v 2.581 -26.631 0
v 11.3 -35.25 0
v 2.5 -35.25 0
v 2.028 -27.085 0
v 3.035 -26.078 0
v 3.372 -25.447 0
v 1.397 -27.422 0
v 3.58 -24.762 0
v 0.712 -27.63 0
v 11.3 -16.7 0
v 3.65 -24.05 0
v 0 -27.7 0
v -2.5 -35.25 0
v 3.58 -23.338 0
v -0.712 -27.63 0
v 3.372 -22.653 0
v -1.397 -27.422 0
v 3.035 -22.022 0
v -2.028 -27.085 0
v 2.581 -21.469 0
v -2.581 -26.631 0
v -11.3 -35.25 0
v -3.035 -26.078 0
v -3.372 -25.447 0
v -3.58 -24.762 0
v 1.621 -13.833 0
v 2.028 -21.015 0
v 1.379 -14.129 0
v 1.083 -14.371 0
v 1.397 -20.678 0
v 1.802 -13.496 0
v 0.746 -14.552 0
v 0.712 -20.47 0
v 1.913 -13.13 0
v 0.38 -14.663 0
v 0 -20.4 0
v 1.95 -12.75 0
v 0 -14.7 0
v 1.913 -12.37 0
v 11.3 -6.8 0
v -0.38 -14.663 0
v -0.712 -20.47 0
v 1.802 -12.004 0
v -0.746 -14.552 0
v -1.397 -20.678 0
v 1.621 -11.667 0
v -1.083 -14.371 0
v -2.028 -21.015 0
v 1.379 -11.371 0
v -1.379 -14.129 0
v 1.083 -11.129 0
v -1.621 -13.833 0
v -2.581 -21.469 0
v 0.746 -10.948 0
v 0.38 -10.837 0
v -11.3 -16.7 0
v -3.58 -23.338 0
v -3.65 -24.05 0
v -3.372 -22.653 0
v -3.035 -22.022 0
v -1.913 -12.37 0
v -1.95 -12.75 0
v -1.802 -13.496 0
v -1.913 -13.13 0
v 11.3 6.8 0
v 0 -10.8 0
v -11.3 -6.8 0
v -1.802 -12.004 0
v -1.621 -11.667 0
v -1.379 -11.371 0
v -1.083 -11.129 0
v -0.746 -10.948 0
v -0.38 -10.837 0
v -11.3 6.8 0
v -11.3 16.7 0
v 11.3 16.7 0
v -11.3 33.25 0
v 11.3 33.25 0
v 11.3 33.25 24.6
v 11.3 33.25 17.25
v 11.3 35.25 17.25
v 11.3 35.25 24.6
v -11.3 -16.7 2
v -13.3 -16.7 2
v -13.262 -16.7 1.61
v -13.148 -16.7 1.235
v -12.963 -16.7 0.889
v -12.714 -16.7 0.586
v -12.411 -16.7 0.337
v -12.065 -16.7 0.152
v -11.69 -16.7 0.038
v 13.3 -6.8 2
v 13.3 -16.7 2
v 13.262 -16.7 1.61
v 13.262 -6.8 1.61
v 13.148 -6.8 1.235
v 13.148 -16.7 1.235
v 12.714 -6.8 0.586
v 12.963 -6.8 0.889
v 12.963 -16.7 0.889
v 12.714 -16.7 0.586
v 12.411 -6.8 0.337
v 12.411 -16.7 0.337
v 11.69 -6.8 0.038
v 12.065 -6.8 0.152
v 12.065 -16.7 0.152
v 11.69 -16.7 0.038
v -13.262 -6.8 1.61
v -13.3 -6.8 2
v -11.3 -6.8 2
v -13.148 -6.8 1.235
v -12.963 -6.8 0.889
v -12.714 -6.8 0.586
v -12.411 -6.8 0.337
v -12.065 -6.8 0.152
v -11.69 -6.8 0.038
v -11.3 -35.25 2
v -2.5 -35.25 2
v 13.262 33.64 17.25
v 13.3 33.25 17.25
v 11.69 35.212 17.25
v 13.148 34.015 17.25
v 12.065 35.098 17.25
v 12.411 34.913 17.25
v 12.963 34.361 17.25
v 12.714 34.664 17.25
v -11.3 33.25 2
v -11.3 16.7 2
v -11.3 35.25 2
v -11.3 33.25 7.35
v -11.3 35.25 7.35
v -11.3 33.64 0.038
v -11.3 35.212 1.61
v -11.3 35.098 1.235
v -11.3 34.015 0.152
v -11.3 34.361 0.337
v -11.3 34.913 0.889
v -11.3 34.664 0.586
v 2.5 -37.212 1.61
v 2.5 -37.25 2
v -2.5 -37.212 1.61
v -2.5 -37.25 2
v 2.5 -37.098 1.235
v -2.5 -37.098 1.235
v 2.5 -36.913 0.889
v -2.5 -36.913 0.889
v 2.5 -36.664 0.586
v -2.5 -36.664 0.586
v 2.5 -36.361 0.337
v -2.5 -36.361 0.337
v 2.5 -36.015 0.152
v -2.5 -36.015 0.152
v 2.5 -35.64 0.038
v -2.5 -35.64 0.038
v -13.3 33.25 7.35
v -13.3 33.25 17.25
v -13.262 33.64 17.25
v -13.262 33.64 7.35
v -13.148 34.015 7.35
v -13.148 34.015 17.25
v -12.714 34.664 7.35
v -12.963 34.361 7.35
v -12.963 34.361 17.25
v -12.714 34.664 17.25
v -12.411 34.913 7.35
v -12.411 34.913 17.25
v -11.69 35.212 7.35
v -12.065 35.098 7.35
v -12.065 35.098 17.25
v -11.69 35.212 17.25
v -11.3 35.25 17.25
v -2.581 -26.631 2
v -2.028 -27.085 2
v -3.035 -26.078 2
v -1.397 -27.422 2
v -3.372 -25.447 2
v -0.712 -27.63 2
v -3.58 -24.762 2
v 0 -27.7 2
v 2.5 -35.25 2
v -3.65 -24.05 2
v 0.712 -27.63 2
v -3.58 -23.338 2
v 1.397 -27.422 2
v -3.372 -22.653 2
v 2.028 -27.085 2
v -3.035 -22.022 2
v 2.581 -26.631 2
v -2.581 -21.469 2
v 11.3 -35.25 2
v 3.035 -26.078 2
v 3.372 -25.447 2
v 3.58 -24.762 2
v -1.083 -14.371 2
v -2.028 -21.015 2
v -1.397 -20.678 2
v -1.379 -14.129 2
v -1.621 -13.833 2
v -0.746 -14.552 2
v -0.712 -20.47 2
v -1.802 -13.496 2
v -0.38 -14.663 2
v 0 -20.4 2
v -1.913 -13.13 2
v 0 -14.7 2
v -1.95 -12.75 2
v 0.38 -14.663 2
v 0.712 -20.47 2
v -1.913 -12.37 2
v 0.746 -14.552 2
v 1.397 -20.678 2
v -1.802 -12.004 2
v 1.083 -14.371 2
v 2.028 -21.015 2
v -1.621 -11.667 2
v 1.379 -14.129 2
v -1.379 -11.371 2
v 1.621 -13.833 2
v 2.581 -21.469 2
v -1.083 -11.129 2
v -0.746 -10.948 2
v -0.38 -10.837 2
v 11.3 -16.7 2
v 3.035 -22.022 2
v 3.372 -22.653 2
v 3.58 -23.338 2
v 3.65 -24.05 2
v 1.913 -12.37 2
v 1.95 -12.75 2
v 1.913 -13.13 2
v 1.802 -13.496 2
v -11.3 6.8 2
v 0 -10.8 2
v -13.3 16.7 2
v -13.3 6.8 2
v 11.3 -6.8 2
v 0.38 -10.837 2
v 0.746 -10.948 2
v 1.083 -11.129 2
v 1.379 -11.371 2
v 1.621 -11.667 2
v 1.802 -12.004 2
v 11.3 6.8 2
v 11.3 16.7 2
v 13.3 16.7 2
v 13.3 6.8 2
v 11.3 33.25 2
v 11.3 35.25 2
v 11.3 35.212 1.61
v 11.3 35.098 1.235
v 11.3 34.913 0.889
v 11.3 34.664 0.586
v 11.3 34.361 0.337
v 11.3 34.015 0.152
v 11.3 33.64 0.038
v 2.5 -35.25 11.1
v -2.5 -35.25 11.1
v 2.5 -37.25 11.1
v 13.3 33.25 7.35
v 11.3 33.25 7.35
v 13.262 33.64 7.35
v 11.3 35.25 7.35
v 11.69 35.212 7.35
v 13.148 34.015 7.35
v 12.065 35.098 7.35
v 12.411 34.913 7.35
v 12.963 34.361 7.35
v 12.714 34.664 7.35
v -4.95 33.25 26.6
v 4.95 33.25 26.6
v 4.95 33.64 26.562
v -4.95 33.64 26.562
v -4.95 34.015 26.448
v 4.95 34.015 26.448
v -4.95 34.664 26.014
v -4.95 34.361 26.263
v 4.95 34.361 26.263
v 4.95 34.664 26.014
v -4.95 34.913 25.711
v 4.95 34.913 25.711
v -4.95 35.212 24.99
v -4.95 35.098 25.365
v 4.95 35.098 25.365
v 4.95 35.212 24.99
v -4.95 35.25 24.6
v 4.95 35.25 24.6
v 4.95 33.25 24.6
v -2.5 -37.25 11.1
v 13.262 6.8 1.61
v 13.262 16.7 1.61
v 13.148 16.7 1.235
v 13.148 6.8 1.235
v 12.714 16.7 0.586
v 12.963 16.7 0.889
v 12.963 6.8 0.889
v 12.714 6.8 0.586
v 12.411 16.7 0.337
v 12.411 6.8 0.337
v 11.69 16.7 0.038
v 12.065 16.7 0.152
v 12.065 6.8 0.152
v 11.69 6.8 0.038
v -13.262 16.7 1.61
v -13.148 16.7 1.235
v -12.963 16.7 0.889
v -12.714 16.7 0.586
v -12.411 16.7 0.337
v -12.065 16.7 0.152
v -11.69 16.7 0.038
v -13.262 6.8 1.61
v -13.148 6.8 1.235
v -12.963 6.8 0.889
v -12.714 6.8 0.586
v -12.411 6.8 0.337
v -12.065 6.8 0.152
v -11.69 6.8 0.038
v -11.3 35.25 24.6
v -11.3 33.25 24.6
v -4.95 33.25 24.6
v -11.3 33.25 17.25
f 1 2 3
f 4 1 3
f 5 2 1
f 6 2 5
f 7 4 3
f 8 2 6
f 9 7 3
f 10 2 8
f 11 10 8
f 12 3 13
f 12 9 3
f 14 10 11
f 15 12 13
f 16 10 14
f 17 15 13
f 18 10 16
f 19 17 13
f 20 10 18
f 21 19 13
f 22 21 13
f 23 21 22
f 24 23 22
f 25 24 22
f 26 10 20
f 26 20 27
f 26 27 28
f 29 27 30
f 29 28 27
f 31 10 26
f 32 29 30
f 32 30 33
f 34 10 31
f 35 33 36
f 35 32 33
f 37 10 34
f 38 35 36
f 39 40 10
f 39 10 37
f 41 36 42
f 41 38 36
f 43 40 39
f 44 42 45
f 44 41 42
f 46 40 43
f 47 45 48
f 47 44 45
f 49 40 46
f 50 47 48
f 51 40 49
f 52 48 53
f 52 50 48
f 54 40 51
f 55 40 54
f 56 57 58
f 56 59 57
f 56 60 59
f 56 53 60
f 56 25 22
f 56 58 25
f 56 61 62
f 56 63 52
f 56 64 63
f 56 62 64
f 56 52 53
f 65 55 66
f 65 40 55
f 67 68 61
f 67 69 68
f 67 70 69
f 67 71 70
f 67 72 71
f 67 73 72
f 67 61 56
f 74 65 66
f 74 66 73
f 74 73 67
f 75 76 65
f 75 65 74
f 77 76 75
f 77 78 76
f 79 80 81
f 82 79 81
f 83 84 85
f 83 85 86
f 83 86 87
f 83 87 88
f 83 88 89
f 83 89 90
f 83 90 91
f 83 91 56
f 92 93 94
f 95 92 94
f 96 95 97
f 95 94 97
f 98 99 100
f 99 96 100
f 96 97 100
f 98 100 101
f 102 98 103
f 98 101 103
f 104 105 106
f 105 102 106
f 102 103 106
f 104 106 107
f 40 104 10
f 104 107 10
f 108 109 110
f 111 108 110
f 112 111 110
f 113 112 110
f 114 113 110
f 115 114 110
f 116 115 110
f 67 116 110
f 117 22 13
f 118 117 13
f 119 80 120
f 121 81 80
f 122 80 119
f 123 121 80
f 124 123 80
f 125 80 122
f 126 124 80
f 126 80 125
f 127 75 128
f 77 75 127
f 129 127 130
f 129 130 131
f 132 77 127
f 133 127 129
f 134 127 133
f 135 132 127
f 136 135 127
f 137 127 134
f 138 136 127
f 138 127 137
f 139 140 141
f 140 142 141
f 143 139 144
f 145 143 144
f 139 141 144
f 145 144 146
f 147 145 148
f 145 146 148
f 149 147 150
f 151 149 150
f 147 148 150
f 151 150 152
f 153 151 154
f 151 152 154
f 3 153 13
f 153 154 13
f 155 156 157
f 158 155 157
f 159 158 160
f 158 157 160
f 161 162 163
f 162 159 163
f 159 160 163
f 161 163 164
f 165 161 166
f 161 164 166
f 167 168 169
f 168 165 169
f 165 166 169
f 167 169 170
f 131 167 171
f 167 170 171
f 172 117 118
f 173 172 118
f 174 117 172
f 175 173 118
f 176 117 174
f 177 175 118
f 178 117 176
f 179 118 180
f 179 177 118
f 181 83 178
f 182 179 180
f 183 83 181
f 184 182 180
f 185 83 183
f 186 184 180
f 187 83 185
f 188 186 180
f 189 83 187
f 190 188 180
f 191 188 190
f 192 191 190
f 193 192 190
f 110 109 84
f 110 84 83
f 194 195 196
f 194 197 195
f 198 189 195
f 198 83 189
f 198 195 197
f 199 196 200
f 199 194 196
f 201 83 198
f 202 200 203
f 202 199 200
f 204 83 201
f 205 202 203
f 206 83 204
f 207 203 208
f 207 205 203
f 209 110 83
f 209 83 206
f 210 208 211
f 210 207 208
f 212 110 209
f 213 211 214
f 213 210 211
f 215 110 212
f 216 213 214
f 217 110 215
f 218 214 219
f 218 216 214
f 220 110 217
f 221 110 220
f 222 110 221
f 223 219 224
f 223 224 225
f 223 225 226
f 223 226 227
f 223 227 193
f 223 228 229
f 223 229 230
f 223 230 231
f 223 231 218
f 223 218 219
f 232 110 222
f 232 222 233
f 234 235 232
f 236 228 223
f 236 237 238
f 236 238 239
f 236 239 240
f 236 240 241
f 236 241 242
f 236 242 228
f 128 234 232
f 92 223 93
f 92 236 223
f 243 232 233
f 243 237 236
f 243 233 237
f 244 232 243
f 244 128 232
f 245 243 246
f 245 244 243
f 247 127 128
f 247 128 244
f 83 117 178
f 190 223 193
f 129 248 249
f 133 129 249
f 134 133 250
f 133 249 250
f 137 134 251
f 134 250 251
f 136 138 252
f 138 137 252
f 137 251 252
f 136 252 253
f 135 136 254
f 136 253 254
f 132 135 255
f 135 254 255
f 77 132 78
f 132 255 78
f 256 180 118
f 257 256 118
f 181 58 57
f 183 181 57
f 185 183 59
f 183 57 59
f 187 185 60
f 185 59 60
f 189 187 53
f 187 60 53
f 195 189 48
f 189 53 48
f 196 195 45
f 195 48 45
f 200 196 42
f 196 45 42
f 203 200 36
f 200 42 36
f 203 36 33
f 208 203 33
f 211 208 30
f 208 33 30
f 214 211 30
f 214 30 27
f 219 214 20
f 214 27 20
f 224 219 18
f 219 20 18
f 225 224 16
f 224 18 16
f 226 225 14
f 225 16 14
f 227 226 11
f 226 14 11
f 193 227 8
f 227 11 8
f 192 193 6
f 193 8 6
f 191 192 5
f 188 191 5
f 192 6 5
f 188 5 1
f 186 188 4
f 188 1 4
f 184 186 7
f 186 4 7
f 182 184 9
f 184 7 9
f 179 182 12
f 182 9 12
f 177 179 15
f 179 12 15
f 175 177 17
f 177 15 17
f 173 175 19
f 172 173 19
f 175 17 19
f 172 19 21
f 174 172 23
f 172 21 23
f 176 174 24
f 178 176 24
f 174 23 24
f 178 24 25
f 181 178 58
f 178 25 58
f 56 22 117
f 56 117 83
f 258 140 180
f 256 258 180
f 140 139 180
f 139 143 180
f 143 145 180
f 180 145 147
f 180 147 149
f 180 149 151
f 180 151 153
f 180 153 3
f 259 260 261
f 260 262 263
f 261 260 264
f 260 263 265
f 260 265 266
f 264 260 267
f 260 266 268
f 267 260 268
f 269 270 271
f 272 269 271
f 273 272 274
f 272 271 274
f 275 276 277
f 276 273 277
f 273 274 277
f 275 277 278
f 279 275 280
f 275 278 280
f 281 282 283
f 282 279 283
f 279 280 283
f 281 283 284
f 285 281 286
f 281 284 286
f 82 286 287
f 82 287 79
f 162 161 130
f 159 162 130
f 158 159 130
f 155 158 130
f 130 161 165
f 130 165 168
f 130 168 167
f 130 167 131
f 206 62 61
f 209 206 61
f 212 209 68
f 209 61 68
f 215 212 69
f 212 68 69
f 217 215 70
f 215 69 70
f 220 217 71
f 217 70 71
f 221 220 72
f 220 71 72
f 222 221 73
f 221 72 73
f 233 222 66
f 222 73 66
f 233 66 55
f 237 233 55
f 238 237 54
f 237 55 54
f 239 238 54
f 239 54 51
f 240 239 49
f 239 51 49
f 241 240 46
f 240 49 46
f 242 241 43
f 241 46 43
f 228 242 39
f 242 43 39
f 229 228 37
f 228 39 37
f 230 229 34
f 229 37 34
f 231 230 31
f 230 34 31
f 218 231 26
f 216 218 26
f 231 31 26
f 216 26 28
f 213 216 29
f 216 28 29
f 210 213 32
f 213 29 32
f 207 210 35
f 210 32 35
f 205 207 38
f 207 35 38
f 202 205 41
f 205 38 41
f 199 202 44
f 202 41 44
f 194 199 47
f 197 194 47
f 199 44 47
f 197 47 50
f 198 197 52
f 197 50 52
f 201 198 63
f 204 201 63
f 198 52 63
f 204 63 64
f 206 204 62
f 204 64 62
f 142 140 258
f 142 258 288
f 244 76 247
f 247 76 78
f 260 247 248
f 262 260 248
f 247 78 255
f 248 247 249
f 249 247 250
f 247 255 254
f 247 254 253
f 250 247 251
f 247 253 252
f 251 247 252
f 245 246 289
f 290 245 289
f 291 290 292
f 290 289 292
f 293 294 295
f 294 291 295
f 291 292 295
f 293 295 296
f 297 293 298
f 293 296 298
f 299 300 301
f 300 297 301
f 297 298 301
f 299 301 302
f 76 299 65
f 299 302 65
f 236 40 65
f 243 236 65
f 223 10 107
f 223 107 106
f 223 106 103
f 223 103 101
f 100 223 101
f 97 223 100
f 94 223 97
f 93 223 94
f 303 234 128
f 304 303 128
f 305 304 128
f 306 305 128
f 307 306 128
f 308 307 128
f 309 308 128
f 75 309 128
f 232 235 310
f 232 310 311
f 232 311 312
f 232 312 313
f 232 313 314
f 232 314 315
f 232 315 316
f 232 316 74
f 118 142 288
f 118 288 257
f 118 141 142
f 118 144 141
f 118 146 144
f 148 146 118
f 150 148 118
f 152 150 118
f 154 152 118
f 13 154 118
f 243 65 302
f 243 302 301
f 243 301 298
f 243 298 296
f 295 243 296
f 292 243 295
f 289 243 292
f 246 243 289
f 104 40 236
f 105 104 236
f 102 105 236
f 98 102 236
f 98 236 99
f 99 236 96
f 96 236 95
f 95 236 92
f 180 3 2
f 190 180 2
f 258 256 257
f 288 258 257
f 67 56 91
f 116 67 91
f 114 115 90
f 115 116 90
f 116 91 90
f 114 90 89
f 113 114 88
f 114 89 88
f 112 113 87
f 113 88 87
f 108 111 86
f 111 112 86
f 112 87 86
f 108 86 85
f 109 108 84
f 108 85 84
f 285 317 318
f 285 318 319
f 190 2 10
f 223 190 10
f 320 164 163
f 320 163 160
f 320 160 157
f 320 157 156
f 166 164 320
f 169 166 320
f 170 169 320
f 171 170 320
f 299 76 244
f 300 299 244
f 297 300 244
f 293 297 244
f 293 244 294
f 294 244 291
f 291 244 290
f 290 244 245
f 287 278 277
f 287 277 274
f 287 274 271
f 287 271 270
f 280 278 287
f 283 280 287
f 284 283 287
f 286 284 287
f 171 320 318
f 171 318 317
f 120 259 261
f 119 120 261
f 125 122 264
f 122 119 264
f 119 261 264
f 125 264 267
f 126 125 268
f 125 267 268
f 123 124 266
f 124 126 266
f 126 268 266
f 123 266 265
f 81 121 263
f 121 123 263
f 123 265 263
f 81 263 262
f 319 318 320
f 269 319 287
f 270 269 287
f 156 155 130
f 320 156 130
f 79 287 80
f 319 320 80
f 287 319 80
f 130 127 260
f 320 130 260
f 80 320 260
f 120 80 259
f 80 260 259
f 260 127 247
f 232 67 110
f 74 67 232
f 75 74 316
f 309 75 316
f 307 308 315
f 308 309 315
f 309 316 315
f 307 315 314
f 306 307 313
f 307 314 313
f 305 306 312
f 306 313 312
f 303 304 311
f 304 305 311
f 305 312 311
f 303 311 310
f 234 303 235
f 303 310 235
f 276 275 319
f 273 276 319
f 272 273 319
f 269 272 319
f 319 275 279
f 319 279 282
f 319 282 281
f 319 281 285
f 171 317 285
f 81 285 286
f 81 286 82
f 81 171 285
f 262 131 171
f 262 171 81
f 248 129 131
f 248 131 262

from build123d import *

# Parameters (mm, degrees)
SKETCH1_W           = 22.6
SKETCH1_H           = 70.5
BOSS_EXTRUDE1_DEPTH = 2
SKETCH2_W           = 22.6
SKETCH2_H           = 2
BOSS_EXTRUDE2_DEPTH = 22.6
SKETCH3_W           = 2
SKETCH3_H           = 9.9
SKETCH3_W_2         = 9.9
SKETCH3_H_2         = 2
BOSS_EXTRUDE3_DEPTH = 2
SKETCH4_W           = 2
SKETCH4_H           = 9.9
BOSS_EXTRUDE4_DEPTH = 2
FILLET1_R           = 2
SKETCH5_W           = 5
SKETCH5_H           = 2
BOSS_EXTRUDE5_DEPTH = 11.1
FILLET2_R           = 2
SKETCH6_R           = 3.65
SKETCH6_R_2         = 1.95
CUT_EXTRUDE1_DEPTH  = 2


with BuildPart() as part:
    # Sketch1 → Boss-Extrude1 (new body)
    with BuildSketch(Plane.XY):
        Rectangle(SKETCH1_W, SKETCH1_H)
    extrude(amount=BOSS_EXTRUDE1_DEPTH)

    # Sketch2 → Boss-Extrude2 (add)
    with BuildSketch(Plane.XY.offset(2)):
        with Locations((0, 34.25)):
            Rectangle(SKETCH2_W, SKETCH2_H)
    extrude(amount=BOSS_EXTRUDE2_DEPTH)

    # Sketch3 → Boss-Extrude3 (add)
    with BuildSketch(Plane(origin=(0, 35.25, 0), x_dir=(1, 0, 0), z_dir=(0, 1, 0))):
        with Locations((-12.3, -12.3)):
            Rectangle(SKETCH3_W, SKETCH3_H)
        with Locations((12.3, -12.3)):
            Rectangle(SKETCH3_W, SKETCH3_H)
        with Locations((0, -25.6)):
            Rectangle(SKETCH3_W_2, SKETCH3_H_2)
    extrude(amount=-BOSS_EXTRUDE3_DEPTH)

    # Sketch4 → Boss-Extrude4 (add)
    with BuildSketch(Plane.XY.offset(2)):
        with Locations((12.3, 11.75)):
            Rectangle(SKETCH4_W, SKETCH4_H)
        with Locations((12.3, -11.75)):
            Rectangle(SKETCH4_W, SKETCH4_H)
        with Locations((-12.3, -11.75)):
            Rectangle(SKETCH4_W, SKETCH4_H)
        with Locations((-12.3, 11.75)):
            Rectangle(SKETCH4_W, SKETCH4_H)
    extrude(amount=-BOSS_EXTRUDE4_DEPTH)

    # Fillet1
    # the kernel refuses this fillet: 2 mm, written as the material it takes off along each edge
    with BuildSketch(Plane(origin=(16.3, 35.25, 0), x_dir=(0, -1, 0), z_dir=(-1, 0, 0))) as fillet1_piece_1:
        with BuildLine():
            CenterArc((FILLET1_R, FILLET1_R), FILLET1_R, 180, 90)
            Line((0, FILLET1_R), (0, 0))
            Line((0, 0), (FILLET1_R, 0))
        make_face()
    extrude(amount=32.6, mode=Mode.SUBTRACT)
    with BuildSketch(Plane(origin=(13.3, 35.25, 2.35), x_dir=(-1, 0, 0), z_dir=(0, 0, 1)), Plane(origin=(9.95, 35.25, 26.6), x_dir=(0, 0, -1), z_dir=(-1, 0, 0)), Plane(origin=(-13.3, 35.25, 22.25), x_dir=(1, 0, 0), z_dir=(0, 0, -1)), Plane(origin=(13.3, 1.8, 0), x_dir=(-1, 0, 0), z_dir=(0, 1, 0)), Plane(origin=(13.3, -21.7, 0), x_dir=(-1, 0, 0), z_dir=(0, 1, 0))) as fillet1_piece_2:
        with BuildLine():
            CenterArc((FILLET1_R, FILLET1_R), FILLET1_R, 180, 90)
            Line((0, FILLET1_R), (0, 0))
            Line((0, 0), (FILLET1_R, 0))
        make_face()
    extrude(amount=19.9, mode=Mode.SUBTRACT)
    with BuildSketch(Plane(origin=(-13.3, -21.7, 0), x_dir=(1, 0, 0), z_dir=(0, 1, 0)), Plane(origin=(-13.3, 1.8, 0), x_dir=(1, 0, 0), z_dir=(0, 1, 0))) as fillet1_piece_3:
        with BuildLine():
            CenterArc((FILLET1_R, -FILLET1_R), FILLET1_R, 90, 90)
            Line((0, -FILLET1_R), (0, 0))
            Line((0, 0), (FILLET1_R, 0))
        make_face()
    extrude(amount=19.9, mode=Mode.SUBTRACT)

    # Sketch5 → Boss-Extrude5 (add)
    with BuildSketch(Plane(origin=(0, 0, 0), x_dir=(-1, 0, 0), z_dir=(0, 0, -1))):
        with Locations((0, -36.25)):
            Rectangle(SKETCH5_W, SKETCH5_H)
    extrude(amount=-BOSS_EXTRUDE5_DEPTH)

    # Fillet2
    fillet2_edges = [part.edges().sort_by_distance(p)[0] for p in [
        (0, -37.25, 0),
    ]]
    fillet(fillet2_edges, radius=FILLET2_R)

    # Sketch6 → Cut-Extrude1 (cut)
    with BuildSketch(Plane(origin=(0, 0, 0), x_dir=(-1, 0, 0), z_dir=(0, 0, -1))):
        with Locations((0, -24.05)):
            Circle(SKETCH6_R)
        with Locations((0, -12.75)):
            Circle(SKETCH6_R_2)
    extrude(amount=-CUT_EXTRUDE1_DEPTH, mode=Mode.SUBTRACT)


solid = part.part
